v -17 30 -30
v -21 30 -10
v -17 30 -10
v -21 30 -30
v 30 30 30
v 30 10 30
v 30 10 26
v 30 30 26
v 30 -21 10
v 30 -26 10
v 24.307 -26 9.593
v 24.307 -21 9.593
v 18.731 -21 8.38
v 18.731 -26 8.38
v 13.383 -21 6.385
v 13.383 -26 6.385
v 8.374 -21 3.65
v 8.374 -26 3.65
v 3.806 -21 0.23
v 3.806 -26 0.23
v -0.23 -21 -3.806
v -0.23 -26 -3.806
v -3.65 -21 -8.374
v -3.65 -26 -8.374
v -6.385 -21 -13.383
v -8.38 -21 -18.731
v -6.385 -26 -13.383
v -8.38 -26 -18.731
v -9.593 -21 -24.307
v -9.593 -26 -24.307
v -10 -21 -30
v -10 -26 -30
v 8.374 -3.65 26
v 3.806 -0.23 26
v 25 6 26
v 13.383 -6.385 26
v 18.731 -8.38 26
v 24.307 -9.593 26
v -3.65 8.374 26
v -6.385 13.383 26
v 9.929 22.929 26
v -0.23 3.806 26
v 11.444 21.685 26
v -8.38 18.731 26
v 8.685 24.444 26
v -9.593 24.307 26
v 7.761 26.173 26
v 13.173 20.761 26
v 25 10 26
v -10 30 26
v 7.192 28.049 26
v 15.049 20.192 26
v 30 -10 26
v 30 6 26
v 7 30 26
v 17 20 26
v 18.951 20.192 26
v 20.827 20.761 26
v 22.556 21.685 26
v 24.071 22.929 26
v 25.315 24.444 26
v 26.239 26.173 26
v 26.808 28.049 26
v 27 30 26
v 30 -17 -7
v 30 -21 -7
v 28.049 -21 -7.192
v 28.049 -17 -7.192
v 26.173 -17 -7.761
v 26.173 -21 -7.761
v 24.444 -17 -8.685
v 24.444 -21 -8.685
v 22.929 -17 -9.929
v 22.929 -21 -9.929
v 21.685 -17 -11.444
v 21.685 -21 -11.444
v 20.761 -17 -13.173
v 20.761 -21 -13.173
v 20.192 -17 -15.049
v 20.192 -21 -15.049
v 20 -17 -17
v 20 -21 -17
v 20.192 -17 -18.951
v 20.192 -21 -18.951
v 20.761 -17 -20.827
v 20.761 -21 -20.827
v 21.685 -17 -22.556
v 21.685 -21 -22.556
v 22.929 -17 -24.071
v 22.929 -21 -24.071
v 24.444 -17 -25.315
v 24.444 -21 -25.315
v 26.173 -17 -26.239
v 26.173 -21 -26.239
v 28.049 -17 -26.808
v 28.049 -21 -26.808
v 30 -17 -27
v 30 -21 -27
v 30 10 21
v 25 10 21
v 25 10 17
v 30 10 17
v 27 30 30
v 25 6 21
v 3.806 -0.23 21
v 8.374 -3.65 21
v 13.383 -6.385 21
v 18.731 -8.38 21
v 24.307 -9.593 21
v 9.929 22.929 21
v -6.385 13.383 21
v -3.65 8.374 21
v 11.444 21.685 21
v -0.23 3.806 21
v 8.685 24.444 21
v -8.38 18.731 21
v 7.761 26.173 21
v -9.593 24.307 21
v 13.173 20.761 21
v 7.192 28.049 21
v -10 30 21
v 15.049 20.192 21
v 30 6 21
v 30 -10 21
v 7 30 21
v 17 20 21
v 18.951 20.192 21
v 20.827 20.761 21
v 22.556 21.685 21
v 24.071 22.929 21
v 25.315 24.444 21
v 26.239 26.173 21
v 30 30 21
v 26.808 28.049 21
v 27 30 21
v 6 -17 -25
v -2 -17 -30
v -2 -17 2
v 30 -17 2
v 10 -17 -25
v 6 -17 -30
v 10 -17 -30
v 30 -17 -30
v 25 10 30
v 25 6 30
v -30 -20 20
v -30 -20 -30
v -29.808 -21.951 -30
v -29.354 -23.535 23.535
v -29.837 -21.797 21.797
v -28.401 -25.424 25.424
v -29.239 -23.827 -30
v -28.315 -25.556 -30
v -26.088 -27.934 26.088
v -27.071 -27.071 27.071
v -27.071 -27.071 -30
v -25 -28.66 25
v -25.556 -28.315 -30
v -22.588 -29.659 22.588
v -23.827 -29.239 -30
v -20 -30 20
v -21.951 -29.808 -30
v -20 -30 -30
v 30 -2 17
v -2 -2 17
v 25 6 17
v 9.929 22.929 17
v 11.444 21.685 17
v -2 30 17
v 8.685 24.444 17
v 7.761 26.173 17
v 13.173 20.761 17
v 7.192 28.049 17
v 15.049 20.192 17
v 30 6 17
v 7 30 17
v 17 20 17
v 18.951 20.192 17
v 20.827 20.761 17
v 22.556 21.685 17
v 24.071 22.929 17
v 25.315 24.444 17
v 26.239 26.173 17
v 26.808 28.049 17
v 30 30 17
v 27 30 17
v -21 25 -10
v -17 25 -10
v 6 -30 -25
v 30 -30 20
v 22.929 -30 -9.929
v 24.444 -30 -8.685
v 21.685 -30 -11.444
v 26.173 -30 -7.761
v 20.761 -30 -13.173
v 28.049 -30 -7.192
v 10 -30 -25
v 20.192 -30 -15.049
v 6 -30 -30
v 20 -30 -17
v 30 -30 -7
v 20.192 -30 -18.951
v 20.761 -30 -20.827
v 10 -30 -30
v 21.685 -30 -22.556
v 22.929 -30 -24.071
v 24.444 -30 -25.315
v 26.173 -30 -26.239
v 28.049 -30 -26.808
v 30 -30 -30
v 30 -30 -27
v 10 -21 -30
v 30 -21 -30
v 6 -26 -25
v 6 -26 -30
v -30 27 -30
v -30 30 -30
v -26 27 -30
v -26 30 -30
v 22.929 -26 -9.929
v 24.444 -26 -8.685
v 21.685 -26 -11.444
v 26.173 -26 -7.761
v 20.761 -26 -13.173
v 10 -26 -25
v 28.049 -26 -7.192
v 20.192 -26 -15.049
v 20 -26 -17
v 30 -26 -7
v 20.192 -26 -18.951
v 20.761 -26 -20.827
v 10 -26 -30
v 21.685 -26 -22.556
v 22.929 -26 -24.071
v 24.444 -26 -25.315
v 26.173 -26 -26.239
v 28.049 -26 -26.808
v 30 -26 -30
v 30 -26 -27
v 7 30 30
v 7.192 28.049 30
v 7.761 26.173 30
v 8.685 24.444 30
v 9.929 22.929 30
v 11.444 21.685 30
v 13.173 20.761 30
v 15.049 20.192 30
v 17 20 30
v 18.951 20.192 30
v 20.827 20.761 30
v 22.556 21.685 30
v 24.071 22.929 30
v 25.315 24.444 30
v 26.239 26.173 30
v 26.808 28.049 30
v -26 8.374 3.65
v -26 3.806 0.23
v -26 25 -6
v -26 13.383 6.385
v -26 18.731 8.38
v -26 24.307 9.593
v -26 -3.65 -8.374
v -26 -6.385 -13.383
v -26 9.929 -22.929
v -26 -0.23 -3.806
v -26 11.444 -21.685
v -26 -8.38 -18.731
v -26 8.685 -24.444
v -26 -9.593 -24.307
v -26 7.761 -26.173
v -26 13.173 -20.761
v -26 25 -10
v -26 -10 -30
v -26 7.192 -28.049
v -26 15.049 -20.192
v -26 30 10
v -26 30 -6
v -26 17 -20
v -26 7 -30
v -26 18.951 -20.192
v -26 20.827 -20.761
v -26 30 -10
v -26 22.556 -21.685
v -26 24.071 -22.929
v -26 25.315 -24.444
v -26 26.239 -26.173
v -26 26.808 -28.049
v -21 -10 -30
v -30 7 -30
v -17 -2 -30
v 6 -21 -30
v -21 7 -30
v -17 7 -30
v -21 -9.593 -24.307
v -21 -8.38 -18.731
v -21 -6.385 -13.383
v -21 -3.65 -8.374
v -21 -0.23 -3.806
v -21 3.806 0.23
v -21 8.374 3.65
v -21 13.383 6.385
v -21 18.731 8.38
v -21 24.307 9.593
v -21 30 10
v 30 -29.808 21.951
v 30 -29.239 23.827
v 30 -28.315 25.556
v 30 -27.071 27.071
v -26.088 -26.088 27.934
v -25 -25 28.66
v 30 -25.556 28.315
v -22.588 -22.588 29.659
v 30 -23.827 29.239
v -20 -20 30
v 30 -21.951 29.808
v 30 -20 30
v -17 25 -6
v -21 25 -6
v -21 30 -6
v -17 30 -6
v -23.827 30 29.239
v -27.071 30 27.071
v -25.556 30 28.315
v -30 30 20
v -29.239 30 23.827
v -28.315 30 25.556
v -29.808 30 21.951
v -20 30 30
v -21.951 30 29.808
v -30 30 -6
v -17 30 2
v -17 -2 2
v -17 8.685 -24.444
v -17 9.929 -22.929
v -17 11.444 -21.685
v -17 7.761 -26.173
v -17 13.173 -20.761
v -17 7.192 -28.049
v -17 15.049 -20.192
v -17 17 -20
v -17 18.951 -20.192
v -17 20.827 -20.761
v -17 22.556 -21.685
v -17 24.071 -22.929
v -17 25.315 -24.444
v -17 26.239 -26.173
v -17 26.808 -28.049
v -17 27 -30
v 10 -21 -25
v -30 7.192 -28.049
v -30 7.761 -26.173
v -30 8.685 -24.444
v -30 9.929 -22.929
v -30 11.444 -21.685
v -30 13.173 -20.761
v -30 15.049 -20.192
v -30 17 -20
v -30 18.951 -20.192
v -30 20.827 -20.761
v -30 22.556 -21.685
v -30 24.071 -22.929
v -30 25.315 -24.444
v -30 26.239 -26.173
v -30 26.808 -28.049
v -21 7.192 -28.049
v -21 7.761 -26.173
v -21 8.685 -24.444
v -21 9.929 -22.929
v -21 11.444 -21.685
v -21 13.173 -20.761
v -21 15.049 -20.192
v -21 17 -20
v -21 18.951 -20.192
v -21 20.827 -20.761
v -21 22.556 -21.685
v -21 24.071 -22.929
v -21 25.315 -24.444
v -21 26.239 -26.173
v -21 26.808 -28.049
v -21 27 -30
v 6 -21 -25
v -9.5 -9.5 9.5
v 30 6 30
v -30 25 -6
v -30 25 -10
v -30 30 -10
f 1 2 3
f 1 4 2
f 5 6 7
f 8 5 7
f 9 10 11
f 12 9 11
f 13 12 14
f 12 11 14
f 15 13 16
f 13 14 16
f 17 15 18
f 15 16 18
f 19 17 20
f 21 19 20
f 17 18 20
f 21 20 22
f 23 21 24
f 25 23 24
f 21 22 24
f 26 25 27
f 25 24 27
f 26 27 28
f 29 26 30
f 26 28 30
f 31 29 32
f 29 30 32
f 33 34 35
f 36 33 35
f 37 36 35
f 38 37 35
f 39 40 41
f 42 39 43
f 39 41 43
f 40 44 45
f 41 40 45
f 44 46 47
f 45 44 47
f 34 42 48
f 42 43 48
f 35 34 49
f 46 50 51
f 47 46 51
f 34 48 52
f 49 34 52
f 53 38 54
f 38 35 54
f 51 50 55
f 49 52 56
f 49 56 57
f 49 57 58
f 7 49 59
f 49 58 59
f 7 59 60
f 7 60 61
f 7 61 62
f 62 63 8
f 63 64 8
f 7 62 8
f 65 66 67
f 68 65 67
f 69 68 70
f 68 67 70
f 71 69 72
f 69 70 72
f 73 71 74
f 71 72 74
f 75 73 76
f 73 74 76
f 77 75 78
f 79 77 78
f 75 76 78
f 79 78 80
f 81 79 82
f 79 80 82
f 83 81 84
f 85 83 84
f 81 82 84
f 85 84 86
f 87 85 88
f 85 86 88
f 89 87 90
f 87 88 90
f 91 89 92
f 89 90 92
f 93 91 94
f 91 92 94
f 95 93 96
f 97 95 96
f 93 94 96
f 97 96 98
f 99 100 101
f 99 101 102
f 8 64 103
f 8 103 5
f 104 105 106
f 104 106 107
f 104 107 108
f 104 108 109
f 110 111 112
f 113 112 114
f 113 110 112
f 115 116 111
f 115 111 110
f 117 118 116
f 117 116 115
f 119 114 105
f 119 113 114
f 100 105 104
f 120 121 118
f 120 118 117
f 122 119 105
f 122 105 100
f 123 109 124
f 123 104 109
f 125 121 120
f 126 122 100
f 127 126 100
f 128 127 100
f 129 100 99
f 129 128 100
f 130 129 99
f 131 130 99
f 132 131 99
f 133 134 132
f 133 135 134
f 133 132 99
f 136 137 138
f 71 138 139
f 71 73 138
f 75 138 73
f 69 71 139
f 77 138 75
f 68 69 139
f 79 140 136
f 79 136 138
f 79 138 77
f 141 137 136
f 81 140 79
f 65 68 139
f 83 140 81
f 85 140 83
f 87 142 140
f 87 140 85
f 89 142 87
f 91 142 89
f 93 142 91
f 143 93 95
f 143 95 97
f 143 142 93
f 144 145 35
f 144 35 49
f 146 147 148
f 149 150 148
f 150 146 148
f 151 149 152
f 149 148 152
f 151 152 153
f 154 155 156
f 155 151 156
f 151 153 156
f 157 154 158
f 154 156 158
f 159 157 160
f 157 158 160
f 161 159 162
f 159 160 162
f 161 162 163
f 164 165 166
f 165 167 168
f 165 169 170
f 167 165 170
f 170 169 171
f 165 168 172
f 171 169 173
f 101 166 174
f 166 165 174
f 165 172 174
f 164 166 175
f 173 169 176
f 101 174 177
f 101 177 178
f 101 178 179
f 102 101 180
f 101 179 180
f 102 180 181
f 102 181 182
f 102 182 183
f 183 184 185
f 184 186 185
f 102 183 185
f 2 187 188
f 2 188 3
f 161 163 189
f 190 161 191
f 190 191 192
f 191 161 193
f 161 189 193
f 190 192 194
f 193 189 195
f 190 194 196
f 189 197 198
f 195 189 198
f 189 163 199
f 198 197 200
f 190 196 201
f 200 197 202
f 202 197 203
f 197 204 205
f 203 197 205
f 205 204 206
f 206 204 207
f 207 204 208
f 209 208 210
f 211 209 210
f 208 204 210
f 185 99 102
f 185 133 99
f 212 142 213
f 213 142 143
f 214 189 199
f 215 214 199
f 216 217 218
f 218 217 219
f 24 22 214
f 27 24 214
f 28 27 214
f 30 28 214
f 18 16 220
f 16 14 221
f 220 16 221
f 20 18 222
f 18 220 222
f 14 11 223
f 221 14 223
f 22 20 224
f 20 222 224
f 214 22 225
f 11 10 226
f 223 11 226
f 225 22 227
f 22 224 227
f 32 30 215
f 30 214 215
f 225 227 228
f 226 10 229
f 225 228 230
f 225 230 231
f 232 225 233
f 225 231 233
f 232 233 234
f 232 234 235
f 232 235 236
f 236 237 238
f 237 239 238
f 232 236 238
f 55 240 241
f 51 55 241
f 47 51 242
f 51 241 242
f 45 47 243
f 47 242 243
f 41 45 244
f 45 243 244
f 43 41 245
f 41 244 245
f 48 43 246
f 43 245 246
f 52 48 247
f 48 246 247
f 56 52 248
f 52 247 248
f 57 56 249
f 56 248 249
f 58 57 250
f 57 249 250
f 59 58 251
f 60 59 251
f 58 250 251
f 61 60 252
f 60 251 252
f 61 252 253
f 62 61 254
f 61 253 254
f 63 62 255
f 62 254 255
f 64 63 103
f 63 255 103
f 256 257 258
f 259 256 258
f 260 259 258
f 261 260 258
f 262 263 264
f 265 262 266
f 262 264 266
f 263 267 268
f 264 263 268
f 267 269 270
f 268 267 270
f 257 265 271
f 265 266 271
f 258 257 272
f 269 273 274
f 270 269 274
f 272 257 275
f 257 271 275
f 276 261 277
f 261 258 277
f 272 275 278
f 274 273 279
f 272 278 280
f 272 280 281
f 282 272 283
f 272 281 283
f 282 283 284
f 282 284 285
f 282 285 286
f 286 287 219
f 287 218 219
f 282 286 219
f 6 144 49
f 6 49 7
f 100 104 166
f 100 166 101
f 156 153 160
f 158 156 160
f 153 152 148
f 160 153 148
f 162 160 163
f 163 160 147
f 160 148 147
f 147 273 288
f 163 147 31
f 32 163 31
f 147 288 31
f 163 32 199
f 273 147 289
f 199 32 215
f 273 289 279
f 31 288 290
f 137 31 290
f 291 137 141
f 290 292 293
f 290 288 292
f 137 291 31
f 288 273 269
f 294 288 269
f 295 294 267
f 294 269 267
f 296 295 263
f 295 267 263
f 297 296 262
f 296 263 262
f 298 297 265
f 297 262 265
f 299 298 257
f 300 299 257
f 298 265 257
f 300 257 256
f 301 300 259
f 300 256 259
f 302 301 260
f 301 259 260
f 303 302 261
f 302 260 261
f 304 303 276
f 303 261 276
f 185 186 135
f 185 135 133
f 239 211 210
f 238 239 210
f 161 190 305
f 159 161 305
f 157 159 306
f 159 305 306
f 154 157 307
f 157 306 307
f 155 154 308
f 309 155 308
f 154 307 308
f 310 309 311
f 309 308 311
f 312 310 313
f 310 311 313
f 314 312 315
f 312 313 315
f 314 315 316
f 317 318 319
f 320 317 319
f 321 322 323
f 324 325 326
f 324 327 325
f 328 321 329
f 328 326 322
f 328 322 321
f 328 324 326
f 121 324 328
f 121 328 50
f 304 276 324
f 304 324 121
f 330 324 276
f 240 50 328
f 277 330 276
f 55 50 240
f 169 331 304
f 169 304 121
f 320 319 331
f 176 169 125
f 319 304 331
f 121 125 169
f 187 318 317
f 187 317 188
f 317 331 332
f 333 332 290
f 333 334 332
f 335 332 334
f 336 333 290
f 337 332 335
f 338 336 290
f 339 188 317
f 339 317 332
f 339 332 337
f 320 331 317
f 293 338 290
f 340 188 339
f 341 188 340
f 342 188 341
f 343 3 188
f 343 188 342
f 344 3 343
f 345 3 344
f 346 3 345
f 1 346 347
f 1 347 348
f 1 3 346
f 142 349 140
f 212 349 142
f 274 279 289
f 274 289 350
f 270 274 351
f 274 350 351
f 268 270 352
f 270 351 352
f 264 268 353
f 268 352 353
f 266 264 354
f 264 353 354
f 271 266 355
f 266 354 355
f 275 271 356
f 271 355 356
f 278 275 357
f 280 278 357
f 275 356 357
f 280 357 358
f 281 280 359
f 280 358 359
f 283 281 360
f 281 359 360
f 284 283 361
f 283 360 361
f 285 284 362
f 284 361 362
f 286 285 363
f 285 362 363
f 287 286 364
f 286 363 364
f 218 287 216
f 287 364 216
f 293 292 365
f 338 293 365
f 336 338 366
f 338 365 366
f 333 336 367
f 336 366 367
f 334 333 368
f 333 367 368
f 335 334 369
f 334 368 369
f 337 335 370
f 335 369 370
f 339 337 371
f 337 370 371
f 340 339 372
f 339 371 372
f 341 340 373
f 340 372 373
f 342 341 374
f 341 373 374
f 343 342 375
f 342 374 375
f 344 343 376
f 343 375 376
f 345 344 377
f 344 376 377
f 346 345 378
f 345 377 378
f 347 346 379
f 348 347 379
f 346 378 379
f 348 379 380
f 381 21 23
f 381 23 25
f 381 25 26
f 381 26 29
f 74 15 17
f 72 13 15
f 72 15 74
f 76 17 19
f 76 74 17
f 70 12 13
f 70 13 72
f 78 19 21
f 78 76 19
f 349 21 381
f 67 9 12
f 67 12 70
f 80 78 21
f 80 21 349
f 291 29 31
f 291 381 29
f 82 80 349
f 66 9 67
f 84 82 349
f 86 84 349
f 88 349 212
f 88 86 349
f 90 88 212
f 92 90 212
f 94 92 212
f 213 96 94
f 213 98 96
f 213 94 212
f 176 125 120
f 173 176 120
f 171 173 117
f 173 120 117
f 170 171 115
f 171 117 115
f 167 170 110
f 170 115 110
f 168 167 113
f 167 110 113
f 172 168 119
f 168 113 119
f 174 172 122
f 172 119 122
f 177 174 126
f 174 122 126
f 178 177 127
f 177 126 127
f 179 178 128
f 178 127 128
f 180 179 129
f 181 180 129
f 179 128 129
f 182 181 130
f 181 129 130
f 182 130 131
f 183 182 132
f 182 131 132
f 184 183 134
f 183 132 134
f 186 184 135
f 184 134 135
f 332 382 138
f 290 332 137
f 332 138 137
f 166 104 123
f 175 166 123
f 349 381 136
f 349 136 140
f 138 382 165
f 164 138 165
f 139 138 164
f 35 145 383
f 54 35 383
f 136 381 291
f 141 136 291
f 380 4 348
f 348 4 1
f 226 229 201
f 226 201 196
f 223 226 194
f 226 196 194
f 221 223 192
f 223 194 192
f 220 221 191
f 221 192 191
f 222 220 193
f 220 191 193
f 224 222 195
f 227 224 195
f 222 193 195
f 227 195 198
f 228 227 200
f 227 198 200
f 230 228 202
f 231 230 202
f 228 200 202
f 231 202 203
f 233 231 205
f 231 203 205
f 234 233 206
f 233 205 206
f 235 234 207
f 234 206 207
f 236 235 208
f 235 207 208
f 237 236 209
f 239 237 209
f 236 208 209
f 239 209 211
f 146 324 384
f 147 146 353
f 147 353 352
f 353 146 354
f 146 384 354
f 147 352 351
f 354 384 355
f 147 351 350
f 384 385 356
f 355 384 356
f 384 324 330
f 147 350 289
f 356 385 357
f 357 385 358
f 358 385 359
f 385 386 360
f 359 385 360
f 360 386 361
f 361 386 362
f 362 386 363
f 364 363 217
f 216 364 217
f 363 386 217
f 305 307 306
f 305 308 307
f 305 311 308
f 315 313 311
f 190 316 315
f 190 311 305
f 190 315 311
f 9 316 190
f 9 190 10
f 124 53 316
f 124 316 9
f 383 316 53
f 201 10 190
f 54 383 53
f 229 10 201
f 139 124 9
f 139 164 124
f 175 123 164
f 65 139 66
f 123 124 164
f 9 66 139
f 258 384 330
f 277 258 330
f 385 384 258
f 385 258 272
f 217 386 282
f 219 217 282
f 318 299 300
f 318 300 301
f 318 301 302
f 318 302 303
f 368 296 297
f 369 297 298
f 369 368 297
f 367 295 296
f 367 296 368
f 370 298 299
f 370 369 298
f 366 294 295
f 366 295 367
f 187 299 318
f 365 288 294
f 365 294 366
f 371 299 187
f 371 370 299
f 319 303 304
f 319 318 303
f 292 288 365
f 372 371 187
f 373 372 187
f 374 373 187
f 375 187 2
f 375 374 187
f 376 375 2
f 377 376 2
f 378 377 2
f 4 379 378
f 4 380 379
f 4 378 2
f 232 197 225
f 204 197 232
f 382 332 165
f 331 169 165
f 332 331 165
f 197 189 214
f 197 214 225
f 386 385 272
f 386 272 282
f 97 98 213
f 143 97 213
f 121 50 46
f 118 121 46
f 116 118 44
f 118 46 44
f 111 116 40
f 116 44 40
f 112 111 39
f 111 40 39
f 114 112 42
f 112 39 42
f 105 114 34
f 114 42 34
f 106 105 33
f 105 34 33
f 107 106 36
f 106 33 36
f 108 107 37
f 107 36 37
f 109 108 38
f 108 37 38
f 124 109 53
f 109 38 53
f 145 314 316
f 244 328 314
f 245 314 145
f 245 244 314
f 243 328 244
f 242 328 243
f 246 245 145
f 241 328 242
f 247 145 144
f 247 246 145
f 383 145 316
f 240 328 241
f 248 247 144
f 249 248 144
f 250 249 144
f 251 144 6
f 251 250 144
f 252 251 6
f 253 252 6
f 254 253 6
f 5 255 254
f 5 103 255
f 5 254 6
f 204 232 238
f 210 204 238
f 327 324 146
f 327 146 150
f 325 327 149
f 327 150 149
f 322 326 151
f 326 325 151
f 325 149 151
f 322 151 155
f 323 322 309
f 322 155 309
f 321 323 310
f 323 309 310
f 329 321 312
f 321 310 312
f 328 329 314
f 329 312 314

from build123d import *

# Parameters (mm, degrees)
SKETCH_1_W               = 60
SKETCH_1_H               = 60
EXTRUDE_2_DEPTH          = 30
FILLET_4_R               = 10
FILLET_5_R               = 10
SKETCH_5_W               = 47
SKETCH_5_H               = 47
CUT_EXTRUDE_4_DEPTH      = 47
CHAMFER_3_SIZE           = 15
CHAMFER_4_SIZE           = 15
CUT_EXTRUDE_START        = -4
SKETCH_6_R               = 40
CUT_EXTRUDE_5_DEPTH      = 5
SKETCH_7_R               = 10
SKETCH_7_W               = 5
SKETCH_7_H               = 4
CUT_EXTRUDE_6_DEPTH      = 13
PATTERN_CIRCULAR_5_COUNT = 3


with BuildPart() as part:
    # 草图1 → 凸台-拉伸2 (new, symmetric)
    with BuildSketch(Plane(origin=(0, 0, 0), x_dir=(1, 0, 0), z_dir=(0, 1, 0))):
        Rectangle(SKETCH_1_W, SKETCH_1_H)
    extrude(amount=EXTRUDE_2_DEPTH, both=True)

    # 圆角4
    fillet_4_edges = [part.edges().sort_by_distance(p)[0] for p in [
        (0, -30, 30),
        (-30, -30, 0),
    ]]
    fillet(fillet_4_edges, radius=FILLET_4_R)

    # 圆角5
    # the kernel refuses this fillet: 10 mm, written as the material it takes off along each edge
    with BuildSketch(Plane(origin=(-30, -45, 30), x_dir=(0, 0, -1), z_dir=(0, 1, 0))) as fillet_5_piece_1:
        with BuildLine():
            CenterArc((FILLET_5_R, -FILLET_5_R), FILLET_5_R, 90, 90)
            Line((0, -FILLET_5_R), (0, 0))
            Line((0, 0), (FILLET_5_R, 0))
        make_face()
    extrude(amount=100, mode=Mode.SUBTRACT)

    # 草图5 → 切除-拉伸4 (cut)
    with BuildSketch(Plane(origin=(0, 30, 0), x_dir=(1, 0, 0), z_dir=(0, 1, 0))):
        with Locations((6.5, 6.5)):
            Rectangle(SKETCH_5_W, SKETCH_5_H)
    extrude(amount=-CUT_EXTRUDE_4_DEPTH, mode=Mode.SUBTRACT)

    # 倒角3
    chamfer_3_edges = [part.edges().sort_by_distance(p)[0] for p in [
        (6.5, -17, 17),
        (-17, -17, -6.5),
    ]]
    chamfer(chamfer_3_edges, length=CHAMFER_3_SIZE)

    # 倒角4
    chamfer_4_edges = [part.edges().sort_by_distance(p)[0] for p in [
        (-17, 14, 17),
    ]]
    chamfer(chamfer_4_edges, length=CHAMFER_4_SIZE)

    # 草图6 → 切除-拉伸5 (cut)
    with BuildSketch(Plane.XY.offset(30).offset(CUT_EXTRUDE_START)):
        with Locations((30, 30)):
            Circle(SKETCH_6_R)
    cut_extrude_5 = extrude(amount=-CUT_EXTRUDE_5_DEPTH, mode=Mode.SUBTRACT)

    # 草图7 → 切除-拉伸6 (cut)
    with BuildSketch(Plane.XY.offset(30)):
        with Locations((17, 30)):
            Circle(SKETCH_7_R)
        with Locations((27.5, 8)):
            Rectangle(SKETCH_7_W, SKETCH_7_H)
    cut_extrude_6 = extrude(amount=-CUT_EXTRUDE_6_DEPTH, mode=Mode.SUBTRACT)

    # 阵列(圆周)5: 切除-拉伸5, 切除-拉伸6 ×3 about axis
    pattern_circular_5_axis = Axis((0, 0, 0), (-0.5773502691896262, -0.5773502691896245, 0.5773502691896266))
    add([cut_extrude_5.rotate(pattern_circular_5_axis, i * 360 / PATTERN_CIRCULAR_5_COUNT) for i in range(1, PATTERN_CIRCULAR_5_COUNT)], mode=Mode.SUBTRACT)
    add([cut_extrude_6.rotate(pattern_circular_5_axis, i * 360 / PATTERN_CIRCULAR_5_COUNT) for i in range(1, PATTERN_CIRCULAR_5_COUNT)], mode=Mode.SUBTRACT)


solid = part.part
